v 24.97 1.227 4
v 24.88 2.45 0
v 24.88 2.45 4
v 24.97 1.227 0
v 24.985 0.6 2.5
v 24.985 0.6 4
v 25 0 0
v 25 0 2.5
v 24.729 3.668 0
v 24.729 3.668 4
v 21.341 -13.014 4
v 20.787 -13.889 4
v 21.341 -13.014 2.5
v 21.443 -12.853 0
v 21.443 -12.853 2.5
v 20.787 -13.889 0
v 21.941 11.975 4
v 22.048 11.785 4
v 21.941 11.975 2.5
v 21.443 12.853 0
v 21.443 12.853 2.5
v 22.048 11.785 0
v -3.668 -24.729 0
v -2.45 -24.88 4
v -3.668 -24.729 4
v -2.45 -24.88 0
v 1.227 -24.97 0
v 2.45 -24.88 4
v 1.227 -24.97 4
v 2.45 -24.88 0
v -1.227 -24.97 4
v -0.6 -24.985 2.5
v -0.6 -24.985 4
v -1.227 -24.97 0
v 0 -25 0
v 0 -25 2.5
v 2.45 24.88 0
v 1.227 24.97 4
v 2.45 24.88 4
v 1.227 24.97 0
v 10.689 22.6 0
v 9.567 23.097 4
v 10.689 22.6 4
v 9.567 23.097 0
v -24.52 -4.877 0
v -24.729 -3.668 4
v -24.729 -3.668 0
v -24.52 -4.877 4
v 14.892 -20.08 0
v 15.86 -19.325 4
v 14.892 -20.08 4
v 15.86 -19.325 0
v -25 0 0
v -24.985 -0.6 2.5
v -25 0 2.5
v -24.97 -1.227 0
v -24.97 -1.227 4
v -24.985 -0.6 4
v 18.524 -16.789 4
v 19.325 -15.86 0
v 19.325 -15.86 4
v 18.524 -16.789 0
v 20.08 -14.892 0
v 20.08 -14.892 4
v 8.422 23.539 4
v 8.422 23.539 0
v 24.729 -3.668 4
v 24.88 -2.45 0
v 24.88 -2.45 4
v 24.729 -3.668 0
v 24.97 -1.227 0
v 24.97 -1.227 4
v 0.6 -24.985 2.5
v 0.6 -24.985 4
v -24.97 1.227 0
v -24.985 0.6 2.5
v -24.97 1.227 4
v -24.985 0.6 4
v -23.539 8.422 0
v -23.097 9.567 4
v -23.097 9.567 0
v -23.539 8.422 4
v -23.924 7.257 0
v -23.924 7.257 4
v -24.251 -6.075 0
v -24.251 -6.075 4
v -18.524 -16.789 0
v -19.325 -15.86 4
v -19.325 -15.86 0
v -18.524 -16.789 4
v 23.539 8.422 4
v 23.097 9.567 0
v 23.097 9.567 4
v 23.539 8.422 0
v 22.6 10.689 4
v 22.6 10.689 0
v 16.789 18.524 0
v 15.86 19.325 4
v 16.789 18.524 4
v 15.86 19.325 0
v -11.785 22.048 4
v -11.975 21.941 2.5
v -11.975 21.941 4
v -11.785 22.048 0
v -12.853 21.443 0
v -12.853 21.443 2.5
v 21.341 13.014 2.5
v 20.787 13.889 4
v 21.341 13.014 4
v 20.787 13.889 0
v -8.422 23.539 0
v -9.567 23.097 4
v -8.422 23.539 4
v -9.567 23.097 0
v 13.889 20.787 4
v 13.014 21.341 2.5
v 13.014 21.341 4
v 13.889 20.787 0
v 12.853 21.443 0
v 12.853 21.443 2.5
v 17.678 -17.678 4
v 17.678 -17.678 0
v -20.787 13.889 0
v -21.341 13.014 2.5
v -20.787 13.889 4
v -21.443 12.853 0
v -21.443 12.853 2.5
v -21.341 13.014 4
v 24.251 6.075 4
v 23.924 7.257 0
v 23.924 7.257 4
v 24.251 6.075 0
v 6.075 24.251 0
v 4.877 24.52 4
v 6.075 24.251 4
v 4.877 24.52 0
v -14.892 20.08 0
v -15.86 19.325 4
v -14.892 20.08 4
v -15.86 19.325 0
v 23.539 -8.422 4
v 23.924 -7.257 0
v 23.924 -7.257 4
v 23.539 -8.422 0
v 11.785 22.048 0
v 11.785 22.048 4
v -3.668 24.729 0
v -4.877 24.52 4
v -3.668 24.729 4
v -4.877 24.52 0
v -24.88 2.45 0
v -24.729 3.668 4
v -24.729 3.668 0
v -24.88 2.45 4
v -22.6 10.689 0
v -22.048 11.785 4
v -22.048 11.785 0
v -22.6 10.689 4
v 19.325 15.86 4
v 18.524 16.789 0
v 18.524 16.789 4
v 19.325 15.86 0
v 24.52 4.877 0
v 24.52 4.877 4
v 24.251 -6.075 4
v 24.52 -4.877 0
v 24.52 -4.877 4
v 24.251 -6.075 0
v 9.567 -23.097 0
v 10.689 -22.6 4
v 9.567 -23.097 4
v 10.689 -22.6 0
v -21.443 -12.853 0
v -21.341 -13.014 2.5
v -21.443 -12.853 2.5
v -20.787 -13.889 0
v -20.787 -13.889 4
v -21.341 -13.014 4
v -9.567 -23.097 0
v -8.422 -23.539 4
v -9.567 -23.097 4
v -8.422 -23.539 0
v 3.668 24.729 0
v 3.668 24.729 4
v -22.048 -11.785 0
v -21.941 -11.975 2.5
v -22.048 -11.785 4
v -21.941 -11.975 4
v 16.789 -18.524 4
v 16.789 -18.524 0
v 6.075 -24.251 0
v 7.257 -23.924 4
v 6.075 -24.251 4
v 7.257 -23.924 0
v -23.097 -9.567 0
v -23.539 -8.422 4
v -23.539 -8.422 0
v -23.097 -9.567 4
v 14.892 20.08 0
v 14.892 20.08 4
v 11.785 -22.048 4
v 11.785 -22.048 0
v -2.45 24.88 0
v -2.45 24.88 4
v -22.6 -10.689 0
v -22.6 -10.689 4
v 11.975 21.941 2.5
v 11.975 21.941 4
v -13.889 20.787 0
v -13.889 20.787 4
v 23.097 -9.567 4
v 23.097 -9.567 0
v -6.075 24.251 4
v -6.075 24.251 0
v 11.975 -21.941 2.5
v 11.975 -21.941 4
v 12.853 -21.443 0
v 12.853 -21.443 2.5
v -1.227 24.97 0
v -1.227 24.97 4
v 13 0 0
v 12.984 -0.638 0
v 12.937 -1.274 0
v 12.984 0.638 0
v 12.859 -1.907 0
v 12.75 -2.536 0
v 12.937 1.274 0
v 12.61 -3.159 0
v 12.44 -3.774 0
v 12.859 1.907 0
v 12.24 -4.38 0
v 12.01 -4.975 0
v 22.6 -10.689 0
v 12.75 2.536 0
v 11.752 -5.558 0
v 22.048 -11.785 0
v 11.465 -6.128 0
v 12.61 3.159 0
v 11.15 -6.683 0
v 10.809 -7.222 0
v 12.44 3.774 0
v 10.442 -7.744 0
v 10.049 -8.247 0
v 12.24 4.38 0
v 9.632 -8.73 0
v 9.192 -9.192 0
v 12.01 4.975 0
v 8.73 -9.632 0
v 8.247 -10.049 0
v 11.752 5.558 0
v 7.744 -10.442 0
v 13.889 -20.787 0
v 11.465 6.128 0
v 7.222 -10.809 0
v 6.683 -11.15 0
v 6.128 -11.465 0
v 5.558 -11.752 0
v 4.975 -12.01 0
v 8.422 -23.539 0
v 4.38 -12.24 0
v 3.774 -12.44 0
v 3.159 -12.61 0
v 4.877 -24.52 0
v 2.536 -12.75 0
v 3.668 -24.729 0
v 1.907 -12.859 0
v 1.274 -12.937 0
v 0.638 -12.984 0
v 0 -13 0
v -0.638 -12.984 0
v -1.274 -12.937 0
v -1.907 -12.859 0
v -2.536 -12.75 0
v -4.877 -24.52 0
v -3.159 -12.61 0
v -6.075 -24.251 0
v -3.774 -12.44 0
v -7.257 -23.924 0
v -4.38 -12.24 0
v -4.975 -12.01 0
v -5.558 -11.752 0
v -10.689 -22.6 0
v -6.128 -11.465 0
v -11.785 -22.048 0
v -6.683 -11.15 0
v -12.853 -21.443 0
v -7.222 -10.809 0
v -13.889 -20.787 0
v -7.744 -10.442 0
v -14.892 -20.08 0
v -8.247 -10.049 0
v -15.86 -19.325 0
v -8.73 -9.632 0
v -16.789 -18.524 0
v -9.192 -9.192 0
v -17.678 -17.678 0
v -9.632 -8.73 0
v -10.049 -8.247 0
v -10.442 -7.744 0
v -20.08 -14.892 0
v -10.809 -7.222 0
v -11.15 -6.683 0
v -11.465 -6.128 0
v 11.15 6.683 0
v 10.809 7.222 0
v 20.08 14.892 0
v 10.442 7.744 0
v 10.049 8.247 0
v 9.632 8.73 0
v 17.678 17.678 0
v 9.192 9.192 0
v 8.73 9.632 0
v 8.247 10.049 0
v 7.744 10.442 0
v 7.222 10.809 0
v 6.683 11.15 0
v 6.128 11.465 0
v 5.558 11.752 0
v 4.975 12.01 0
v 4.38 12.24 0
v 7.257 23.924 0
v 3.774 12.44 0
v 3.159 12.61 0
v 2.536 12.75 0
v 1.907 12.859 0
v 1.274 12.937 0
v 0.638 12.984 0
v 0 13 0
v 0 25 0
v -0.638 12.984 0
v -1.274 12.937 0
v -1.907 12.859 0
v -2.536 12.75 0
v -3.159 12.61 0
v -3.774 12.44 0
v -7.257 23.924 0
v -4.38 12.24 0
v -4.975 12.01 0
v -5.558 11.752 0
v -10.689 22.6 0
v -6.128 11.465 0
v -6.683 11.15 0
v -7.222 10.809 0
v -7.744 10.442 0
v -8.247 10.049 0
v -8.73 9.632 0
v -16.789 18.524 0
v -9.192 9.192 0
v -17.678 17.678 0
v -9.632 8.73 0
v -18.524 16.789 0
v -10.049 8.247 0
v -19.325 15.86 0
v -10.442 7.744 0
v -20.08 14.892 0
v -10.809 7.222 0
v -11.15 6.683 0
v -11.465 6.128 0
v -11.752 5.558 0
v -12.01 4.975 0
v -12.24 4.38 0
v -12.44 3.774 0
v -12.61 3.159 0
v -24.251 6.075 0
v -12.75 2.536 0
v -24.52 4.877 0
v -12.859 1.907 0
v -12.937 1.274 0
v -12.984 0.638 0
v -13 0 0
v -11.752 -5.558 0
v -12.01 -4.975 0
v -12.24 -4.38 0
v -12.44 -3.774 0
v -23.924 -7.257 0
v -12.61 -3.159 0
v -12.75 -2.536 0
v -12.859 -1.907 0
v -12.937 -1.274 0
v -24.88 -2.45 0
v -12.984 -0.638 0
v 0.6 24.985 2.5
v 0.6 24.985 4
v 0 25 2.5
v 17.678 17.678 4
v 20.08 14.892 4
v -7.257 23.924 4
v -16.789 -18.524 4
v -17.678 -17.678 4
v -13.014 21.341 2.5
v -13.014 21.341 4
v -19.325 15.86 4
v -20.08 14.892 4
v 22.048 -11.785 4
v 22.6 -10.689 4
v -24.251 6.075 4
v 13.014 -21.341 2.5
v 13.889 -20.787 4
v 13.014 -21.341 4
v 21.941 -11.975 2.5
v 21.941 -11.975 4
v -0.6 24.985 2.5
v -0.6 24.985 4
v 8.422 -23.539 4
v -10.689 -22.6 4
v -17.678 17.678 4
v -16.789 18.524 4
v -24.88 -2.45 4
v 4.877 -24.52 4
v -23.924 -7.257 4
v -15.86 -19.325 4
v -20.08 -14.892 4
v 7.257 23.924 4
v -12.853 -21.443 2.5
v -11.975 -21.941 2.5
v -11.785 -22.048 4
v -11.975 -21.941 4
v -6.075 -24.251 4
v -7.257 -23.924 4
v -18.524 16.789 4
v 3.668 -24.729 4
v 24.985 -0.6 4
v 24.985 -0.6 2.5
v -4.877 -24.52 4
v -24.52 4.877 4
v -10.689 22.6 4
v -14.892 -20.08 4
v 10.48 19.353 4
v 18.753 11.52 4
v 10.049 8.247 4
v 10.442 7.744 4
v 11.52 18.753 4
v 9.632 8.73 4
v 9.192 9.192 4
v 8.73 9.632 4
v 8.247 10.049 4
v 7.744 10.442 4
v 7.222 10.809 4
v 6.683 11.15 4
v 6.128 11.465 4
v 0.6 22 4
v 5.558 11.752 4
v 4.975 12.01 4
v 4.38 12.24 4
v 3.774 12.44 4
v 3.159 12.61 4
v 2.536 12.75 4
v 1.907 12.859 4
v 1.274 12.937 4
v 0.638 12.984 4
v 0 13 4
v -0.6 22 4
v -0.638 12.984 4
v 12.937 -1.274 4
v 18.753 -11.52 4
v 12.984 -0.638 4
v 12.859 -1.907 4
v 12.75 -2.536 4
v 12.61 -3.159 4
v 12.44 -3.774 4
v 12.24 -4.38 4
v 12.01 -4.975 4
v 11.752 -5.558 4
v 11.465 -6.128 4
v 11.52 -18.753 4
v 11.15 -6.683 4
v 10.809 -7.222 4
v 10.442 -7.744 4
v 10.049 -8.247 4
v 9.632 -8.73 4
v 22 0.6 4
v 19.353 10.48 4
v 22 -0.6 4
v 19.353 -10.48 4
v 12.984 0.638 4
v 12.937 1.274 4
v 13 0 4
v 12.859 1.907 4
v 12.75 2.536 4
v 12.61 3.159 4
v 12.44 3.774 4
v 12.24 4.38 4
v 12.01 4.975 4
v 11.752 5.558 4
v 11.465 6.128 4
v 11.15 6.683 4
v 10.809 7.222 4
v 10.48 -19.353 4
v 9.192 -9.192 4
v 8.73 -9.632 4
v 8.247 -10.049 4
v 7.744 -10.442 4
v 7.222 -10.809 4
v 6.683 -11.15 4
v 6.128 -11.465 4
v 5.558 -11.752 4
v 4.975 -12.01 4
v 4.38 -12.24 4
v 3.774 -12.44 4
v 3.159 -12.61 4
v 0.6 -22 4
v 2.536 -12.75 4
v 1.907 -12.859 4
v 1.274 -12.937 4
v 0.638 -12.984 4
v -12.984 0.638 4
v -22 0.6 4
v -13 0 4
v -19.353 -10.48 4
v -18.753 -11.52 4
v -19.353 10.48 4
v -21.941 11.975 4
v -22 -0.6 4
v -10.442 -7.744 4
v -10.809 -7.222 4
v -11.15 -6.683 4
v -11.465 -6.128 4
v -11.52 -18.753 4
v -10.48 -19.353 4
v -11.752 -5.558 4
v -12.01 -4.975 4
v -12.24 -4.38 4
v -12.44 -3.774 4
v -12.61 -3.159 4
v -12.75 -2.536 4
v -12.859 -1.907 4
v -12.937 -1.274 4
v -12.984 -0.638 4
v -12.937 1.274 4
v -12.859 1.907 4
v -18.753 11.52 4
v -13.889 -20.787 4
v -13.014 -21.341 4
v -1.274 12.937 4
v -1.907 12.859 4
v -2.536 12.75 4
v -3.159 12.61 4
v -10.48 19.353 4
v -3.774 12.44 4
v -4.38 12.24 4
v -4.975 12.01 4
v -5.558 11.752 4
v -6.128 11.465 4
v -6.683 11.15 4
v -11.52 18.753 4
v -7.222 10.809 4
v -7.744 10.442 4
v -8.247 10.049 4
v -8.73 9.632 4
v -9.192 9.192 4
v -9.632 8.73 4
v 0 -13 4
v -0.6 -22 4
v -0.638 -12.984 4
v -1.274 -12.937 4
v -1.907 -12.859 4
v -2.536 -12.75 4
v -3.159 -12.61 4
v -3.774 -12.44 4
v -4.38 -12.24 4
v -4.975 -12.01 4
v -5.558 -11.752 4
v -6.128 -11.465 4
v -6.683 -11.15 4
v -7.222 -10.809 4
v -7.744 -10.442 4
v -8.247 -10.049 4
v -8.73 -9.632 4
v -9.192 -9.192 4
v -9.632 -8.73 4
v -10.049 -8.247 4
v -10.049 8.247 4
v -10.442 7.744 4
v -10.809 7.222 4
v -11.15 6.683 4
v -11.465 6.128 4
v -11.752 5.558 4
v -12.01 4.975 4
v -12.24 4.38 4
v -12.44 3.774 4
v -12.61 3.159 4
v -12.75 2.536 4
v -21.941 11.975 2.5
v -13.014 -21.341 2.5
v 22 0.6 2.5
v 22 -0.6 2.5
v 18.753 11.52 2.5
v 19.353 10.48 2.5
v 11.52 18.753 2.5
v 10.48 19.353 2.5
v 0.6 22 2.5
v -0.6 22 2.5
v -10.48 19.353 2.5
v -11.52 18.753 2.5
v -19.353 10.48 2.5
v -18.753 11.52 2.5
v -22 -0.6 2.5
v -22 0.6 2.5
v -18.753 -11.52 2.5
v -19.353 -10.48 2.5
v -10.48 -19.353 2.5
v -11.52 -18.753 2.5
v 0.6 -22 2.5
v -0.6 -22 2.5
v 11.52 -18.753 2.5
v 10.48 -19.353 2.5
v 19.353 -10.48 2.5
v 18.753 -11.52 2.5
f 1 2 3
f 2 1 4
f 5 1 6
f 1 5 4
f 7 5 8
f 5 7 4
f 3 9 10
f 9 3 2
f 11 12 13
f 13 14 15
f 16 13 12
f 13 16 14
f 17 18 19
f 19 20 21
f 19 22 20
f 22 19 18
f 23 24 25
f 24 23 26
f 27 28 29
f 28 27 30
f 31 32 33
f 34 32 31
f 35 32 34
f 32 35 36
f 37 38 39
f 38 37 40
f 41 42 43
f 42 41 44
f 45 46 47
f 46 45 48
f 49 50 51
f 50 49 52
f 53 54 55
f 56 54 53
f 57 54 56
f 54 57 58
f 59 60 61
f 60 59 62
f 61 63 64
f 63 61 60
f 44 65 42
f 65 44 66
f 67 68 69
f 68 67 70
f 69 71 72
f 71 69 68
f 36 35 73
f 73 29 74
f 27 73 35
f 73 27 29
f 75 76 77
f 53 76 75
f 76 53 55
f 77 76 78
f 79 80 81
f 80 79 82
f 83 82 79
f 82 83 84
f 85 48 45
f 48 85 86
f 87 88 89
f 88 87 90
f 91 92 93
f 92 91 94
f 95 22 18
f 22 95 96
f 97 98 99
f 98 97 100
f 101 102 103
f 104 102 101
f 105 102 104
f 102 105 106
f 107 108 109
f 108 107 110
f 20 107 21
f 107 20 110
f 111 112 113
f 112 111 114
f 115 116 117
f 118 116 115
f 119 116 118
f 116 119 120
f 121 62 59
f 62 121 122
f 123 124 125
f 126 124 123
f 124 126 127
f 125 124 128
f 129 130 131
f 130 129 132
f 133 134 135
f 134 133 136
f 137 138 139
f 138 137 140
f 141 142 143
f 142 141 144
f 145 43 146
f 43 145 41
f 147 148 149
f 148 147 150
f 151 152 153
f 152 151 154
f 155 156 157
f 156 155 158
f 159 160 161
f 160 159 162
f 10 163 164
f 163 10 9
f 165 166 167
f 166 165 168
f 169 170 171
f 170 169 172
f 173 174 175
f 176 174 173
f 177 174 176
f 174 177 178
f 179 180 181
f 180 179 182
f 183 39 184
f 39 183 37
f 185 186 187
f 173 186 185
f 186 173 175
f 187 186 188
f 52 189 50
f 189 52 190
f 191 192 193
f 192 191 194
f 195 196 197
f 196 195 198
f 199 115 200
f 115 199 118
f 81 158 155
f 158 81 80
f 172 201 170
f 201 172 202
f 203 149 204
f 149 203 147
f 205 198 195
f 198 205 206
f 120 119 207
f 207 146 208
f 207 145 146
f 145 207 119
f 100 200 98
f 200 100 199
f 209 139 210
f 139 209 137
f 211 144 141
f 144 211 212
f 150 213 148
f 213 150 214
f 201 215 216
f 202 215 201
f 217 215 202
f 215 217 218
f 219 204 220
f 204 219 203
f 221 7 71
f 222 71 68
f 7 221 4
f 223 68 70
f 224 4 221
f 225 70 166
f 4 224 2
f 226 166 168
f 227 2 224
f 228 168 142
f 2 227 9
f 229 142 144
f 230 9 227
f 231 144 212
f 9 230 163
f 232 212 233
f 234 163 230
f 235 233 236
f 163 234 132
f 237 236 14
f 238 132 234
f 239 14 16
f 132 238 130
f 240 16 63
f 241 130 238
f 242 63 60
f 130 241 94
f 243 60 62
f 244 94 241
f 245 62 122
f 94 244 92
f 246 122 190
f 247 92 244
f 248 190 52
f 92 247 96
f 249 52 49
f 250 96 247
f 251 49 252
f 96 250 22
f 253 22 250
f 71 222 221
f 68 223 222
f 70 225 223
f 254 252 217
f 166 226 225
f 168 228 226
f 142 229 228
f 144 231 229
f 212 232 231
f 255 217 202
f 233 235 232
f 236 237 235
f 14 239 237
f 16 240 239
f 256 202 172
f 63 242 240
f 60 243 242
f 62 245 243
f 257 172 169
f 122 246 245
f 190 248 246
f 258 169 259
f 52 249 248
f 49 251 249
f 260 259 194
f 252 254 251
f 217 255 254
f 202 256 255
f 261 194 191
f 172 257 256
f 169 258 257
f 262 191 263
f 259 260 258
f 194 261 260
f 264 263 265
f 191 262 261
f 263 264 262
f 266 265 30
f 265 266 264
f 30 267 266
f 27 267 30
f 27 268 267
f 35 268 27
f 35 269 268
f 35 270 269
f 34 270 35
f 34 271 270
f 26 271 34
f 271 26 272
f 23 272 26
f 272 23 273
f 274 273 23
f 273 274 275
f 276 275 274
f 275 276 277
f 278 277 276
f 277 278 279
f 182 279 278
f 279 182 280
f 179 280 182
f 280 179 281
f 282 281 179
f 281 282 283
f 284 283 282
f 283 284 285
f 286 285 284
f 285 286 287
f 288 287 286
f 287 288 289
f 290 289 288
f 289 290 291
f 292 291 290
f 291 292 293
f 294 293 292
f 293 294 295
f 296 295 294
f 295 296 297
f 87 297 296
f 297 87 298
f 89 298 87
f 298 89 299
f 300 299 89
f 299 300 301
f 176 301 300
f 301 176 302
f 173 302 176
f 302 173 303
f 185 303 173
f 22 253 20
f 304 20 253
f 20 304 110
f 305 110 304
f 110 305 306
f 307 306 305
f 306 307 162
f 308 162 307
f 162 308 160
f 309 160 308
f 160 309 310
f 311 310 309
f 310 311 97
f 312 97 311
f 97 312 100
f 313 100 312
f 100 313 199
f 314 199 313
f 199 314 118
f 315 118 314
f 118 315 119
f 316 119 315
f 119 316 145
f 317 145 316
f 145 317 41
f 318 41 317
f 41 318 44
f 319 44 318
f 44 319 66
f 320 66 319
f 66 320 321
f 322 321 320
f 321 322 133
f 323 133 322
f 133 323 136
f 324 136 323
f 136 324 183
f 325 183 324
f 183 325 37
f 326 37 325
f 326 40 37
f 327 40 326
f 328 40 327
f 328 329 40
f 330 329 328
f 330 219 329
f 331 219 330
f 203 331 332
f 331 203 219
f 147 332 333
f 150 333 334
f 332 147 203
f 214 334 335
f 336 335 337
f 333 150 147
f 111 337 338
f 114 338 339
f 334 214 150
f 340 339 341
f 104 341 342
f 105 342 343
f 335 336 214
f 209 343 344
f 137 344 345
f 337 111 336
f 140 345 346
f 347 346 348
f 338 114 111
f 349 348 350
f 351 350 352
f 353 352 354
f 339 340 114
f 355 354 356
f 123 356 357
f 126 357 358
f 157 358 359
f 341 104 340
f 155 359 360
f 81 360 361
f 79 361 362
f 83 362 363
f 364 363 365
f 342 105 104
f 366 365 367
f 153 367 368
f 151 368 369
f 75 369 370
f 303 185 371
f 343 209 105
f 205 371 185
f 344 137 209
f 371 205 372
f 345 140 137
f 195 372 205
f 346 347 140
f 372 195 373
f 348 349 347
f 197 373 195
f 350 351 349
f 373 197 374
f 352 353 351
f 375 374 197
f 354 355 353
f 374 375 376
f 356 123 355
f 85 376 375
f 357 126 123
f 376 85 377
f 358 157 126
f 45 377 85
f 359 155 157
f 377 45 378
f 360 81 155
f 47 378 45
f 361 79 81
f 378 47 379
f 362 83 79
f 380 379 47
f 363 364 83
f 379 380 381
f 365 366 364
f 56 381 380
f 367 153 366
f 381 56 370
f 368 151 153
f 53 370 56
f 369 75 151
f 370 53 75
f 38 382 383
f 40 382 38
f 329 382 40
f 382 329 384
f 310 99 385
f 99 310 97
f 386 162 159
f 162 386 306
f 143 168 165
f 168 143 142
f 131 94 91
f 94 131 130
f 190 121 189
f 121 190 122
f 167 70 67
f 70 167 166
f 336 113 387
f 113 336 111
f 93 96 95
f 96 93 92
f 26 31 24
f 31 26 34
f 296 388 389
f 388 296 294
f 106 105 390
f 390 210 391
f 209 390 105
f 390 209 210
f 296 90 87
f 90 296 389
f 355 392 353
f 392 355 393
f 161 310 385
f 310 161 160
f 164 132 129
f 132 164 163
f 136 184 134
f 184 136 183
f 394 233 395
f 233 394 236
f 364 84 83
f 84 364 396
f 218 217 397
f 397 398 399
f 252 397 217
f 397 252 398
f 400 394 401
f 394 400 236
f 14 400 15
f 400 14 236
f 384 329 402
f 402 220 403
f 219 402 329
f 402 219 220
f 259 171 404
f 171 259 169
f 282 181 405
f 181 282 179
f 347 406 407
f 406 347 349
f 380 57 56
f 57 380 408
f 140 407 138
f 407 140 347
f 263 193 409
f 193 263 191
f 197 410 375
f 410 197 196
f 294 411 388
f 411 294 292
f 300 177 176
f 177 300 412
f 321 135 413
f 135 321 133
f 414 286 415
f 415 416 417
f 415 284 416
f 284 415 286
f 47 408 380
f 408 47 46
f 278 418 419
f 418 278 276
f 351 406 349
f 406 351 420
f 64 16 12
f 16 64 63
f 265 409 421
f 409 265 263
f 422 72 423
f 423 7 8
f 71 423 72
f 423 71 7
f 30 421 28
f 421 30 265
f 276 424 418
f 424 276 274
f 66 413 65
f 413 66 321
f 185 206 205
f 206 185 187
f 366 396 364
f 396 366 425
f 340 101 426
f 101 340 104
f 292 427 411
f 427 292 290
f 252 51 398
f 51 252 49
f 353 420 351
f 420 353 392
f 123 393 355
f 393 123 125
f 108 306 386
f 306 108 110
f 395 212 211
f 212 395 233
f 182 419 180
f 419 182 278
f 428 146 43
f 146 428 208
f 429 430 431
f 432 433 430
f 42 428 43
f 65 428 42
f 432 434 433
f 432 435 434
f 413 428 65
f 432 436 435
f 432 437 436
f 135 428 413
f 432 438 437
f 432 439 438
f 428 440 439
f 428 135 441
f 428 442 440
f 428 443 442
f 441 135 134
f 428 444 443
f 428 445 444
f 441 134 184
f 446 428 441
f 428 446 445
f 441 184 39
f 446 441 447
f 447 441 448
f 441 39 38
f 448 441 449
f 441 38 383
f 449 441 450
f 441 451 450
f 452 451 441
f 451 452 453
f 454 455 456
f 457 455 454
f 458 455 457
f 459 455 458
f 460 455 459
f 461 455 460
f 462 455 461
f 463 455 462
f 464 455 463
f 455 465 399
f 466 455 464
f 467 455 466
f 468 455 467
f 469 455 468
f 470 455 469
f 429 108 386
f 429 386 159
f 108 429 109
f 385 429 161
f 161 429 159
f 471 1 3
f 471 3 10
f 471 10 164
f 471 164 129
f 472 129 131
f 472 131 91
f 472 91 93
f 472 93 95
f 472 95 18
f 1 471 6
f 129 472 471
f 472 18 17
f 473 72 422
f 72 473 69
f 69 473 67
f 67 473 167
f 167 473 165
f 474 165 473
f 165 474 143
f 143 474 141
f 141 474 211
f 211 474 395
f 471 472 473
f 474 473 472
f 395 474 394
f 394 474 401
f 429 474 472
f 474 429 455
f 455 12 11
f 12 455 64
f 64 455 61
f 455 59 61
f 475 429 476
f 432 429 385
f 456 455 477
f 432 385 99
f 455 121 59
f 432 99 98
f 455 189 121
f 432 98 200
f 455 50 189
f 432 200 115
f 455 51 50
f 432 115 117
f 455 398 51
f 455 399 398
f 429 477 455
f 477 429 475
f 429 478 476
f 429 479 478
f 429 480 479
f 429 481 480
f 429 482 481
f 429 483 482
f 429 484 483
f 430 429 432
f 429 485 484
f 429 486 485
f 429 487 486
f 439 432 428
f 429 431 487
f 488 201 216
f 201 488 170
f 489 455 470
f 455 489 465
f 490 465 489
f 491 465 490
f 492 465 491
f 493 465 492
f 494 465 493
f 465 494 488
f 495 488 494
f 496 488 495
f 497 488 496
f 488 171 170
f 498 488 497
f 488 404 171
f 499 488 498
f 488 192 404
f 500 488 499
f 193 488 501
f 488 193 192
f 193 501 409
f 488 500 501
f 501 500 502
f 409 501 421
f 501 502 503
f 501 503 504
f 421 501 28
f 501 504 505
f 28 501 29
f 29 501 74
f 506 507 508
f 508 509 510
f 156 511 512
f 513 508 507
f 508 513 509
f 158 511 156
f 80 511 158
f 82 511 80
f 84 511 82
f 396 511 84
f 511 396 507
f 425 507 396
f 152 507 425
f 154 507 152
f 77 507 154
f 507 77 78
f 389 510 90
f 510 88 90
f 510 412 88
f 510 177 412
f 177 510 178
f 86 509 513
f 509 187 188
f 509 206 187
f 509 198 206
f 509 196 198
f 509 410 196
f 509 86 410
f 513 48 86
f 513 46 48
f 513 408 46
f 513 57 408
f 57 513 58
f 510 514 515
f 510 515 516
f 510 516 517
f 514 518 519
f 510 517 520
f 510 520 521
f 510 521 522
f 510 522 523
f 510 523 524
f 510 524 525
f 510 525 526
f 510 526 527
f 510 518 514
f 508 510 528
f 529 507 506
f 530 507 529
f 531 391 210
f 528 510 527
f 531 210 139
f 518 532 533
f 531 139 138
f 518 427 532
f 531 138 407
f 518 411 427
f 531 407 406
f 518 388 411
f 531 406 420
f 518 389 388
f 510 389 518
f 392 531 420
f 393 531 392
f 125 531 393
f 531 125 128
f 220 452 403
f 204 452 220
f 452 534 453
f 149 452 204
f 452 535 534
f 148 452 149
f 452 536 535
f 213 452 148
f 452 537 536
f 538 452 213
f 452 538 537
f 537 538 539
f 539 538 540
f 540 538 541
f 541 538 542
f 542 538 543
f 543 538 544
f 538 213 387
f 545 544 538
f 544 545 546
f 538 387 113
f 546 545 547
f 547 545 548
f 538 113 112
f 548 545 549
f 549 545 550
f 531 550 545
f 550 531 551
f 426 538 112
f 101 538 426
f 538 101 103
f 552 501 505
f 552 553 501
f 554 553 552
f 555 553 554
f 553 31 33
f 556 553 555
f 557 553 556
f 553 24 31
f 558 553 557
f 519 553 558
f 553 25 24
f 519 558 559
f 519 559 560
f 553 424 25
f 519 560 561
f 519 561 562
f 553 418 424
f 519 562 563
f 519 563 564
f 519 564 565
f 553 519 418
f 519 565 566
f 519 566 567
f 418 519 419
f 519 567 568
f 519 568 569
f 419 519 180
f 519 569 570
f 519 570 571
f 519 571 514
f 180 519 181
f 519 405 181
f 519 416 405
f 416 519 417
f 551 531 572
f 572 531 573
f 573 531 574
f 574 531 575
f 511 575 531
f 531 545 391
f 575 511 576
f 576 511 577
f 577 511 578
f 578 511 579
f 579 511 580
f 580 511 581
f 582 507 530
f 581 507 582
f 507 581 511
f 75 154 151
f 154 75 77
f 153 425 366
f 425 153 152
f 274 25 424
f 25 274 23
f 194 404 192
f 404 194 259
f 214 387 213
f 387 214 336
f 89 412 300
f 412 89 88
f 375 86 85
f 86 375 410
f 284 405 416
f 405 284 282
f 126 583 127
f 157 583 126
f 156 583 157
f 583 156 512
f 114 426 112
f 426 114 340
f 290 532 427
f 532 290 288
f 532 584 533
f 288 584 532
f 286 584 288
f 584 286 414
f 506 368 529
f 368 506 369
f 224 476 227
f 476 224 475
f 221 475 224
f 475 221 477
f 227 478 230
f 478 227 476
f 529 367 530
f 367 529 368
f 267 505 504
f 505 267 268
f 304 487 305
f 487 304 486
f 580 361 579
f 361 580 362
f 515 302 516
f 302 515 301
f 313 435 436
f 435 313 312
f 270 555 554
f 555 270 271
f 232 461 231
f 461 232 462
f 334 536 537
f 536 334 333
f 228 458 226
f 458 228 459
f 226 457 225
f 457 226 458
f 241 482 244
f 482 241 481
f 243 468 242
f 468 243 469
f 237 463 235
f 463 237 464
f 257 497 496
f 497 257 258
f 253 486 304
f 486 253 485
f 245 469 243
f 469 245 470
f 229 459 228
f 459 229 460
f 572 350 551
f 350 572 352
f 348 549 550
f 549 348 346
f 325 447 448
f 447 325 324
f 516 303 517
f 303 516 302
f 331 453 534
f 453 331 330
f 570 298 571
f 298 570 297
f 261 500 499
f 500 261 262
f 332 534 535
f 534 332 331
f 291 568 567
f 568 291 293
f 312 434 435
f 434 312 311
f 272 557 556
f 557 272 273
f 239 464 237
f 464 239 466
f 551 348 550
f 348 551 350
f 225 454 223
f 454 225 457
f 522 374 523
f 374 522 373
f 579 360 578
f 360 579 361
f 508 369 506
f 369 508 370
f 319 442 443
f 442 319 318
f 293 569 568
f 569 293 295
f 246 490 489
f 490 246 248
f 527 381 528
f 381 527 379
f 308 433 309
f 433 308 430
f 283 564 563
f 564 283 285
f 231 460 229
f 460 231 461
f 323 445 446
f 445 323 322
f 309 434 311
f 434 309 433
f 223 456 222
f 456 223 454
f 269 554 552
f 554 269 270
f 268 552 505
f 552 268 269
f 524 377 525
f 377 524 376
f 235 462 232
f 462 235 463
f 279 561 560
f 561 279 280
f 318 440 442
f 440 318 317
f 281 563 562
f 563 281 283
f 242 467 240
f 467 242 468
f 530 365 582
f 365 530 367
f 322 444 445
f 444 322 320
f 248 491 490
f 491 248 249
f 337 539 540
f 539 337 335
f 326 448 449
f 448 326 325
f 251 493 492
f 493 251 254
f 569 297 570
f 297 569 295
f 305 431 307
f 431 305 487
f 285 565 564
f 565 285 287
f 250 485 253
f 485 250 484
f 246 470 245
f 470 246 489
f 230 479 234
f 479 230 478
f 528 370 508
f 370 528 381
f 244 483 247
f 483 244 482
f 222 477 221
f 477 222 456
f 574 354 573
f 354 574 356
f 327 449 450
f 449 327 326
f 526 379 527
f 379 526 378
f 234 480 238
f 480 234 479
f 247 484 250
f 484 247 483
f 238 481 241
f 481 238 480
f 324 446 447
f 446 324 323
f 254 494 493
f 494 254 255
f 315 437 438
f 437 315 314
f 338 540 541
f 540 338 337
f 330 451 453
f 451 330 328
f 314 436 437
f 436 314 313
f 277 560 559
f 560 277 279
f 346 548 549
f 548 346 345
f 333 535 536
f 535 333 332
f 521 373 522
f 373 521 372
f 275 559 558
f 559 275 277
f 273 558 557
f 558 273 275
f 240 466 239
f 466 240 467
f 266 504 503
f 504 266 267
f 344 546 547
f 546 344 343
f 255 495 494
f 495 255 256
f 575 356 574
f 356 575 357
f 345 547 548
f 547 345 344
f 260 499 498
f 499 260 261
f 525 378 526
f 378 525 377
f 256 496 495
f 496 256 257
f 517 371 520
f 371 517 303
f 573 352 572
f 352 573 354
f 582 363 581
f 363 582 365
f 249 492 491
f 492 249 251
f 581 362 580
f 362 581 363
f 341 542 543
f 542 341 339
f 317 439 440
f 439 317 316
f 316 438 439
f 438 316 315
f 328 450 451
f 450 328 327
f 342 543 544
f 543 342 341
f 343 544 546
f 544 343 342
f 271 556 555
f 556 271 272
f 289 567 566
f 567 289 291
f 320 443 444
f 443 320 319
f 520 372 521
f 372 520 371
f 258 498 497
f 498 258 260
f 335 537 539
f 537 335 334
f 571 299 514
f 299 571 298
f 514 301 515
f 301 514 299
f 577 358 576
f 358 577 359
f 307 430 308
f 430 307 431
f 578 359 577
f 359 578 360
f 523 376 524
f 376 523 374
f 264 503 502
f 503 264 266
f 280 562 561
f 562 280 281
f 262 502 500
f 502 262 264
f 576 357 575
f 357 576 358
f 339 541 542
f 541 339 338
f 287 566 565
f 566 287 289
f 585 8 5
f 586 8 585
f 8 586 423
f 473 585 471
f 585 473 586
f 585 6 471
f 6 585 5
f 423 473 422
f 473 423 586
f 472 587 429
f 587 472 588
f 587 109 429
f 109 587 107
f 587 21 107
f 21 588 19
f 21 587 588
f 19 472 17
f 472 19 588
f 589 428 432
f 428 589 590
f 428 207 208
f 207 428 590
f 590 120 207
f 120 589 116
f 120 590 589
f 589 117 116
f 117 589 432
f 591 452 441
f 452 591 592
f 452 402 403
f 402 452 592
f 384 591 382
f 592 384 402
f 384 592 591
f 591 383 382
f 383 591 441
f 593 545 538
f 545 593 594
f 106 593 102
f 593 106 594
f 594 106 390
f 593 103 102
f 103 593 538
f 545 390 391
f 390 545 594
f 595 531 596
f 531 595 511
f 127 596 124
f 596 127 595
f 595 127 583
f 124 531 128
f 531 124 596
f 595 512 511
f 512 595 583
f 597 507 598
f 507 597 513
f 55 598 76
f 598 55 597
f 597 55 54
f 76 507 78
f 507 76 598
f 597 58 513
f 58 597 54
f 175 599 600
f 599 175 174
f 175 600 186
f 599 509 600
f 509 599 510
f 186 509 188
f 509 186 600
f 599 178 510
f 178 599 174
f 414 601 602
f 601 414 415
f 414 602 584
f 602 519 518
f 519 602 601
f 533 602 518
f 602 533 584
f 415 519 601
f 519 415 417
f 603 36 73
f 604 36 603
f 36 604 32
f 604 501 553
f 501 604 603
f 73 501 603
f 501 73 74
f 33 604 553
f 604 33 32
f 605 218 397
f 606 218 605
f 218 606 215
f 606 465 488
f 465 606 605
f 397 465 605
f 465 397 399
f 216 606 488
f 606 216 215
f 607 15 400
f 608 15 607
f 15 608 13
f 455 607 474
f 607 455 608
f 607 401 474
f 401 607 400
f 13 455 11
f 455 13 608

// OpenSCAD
// Flat dial ring with radial tick marks for a rotary stage
// Units: mm. Print orientation: flat on bed, top face up.

$fn = 128;

// --- Ring dimensions ---
outer_d   = 50;    // outer diameter
inner_d   = 26;    // inner (bore) diameter
thickness = 4;     // ring thickness (Z)

// --- Tick marks ---
tick_count  = 12;   // number of evenly spaced ticks
tick_width  = 1.2;  // groove width
tick_depth  = 1.5;  // groove depth from top face
tick_length = 3;    // radial length inward from outer edge
start_angle = 0;    // first tick on +X axis

// --- Clearances for clean boolean cuts ---
eps     = 0.5;      // overcut past faces
outer_r = outer_d / 2;
inner_r = inner_d / 2;

difference() {
    // Annulus
    difference() {
        cylinder(h = thickness, r = outer_r);
        translate([0, 0, -eps])
            cylinder(h = thickness + 2 * eps, r = inner_r);
    }

    // Radial tick grooves in the top face
    for (i = [0 : tick_count - 1]) {
        rotate([0, 0, start_angle + i * 360 / tick_count])
            translate([outer_r - tick_length,
                       -tick_width / 2,
                       thickness - tick_depth])
                cube([tick_length + eps, tick_width, tick_depth + eps]);
    }
}
